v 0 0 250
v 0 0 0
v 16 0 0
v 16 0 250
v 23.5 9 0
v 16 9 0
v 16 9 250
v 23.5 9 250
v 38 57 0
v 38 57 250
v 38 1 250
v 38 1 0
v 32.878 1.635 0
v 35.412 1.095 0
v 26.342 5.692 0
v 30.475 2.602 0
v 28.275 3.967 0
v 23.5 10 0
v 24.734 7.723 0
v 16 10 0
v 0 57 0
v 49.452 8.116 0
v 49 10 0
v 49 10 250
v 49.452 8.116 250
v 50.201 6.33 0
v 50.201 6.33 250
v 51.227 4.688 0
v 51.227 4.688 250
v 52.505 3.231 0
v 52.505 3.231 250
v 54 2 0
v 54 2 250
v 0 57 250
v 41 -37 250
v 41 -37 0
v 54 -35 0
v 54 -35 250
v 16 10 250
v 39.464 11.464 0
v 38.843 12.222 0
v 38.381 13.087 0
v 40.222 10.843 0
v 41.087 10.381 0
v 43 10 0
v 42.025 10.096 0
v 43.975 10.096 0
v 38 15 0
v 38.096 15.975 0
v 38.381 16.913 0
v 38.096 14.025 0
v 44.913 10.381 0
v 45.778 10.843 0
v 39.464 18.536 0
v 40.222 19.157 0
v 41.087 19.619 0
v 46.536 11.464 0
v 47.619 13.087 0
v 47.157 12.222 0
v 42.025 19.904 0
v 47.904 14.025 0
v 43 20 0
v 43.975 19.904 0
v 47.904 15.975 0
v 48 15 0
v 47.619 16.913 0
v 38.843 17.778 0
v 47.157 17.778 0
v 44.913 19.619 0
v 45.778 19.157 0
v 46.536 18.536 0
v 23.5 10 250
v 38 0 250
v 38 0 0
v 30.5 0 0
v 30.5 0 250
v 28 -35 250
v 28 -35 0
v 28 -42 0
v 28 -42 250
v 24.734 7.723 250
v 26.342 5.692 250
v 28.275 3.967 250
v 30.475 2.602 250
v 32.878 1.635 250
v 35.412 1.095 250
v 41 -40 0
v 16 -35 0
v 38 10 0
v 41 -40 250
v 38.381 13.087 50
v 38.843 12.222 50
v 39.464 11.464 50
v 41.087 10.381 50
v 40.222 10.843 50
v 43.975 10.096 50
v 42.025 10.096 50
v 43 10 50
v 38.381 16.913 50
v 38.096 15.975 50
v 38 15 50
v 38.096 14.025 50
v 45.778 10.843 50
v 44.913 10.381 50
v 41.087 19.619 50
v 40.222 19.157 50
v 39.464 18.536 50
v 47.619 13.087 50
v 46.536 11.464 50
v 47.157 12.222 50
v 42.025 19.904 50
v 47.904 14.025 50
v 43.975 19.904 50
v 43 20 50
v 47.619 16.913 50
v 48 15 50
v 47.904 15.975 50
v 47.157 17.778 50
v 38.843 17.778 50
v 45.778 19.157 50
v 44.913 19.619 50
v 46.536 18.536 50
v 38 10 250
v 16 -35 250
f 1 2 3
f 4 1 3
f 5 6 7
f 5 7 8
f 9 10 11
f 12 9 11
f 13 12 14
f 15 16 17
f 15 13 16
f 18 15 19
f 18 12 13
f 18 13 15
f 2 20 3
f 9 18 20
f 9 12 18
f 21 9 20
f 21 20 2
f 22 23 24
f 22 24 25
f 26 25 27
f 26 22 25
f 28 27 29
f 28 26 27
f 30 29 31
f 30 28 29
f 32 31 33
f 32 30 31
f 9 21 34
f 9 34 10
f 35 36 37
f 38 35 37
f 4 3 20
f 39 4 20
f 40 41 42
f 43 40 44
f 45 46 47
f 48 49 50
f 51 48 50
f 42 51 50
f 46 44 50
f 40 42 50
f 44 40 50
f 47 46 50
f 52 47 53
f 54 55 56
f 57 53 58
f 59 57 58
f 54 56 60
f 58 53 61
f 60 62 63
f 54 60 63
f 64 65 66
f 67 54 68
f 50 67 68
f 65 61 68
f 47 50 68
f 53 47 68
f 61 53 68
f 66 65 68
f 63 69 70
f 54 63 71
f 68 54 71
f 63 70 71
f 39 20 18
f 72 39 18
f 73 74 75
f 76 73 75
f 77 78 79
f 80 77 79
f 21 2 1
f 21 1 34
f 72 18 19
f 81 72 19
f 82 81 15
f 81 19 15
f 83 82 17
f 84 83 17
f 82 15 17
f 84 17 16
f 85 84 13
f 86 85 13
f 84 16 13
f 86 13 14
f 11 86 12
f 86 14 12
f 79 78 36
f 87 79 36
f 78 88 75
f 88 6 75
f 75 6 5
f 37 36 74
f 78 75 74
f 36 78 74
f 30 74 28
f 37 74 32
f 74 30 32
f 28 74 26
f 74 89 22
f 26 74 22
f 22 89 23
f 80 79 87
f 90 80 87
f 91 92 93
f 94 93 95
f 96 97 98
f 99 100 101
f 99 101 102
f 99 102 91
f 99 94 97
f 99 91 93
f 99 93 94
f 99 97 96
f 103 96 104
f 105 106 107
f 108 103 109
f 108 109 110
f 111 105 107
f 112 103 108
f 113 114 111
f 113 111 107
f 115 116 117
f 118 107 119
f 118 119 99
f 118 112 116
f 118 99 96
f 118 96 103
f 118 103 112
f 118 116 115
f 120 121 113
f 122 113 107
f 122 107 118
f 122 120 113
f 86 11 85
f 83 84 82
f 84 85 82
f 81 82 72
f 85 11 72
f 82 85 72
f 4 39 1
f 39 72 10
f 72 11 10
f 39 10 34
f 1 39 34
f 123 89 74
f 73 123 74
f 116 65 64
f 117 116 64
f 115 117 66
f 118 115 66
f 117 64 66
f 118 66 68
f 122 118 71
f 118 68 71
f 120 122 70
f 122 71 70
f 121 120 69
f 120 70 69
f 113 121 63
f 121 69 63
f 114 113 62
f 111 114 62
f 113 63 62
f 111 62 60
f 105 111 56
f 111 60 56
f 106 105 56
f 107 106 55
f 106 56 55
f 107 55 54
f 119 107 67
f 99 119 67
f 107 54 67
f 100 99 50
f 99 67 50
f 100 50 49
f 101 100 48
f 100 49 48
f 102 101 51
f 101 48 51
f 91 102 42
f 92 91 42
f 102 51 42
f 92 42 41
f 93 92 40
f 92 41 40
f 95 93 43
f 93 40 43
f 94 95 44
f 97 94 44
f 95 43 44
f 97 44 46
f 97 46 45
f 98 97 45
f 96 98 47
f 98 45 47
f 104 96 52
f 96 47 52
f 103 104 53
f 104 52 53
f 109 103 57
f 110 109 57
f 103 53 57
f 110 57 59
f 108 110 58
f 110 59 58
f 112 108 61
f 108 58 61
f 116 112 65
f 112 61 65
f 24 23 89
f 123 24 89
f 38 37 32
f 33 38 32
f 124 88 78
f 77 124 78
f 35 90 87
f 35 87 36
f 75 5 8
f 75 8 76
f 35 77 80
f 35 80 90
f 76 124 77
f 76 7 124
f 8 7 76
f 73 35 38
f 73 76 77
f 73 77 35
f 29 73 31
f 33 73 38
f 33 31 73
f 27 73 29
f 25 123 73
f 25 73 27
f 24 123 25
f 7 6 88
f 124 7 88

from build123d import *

# Parameters (mm, degrees)
EXTRUDE_DEPTH    = 250
EXTRUDE001_DEPTH = 250
SKETCH005_R      = 5
EXTRUDE002_DEPTH = 50


with BuildPart() as extrude_body:
    # Sketch003 → Extrude (new body)
    with BuildSketch(Plane.XY):
        with BuildLine():
            Line((0, 0), (0, 57))
            Line((0, 57), (38, 57))
            Line((38, 57), (38, 1))
            ThreePointArc((23.5, 10), (29.345332, 3.236924), (38, 1))
            Line((16, 10), (23.5, 10))
            Line((16, 0), (16, 10))
            Line((0, 0), (16, 0))
        make_face()
    extrude(amount=EXTRUDE_DEPTH)


with BuildPart() as extrude001:
    # Sketch004 (on Sketch) → Extrude001 (new body)
    with BuildSketch(Plane.XY):
        with BuildLine():
            Line((16, -35), (28, -35))
            Line((28, -35), (28, -42))
            Line((28, -42), (41, -40))
            Line((41, -40), (41, -37))
            Line((41, -37), (54, -35))
            Line((54, -35), (54, 2))
            ThreePointArc((49, 10), (50.680866, 5.488041), (54, 2))
            Line((49, 10), (38, 10))
            Line((38, 10), (38, 0))
            Line((38, 0), (30.5, 0))
            Line((23.5, 9), (30.5, 0))
            Line((16, 9), (23.5, 9))
            Line((16, 9), (16, -35))
        make_face()
    extrude(amount=EXTRUDE001_DEPTH)


with BuildPart() as extrude002:
    # Sketch005 (on Sketch) → Extrude002 (new body)
    with BuildSketch(Plane.XY):
        with Locations((43, 15)):
            Circle(SKETCH005_R)
    extrude(amount=EXTRUDE002_DEPTH)


solid = Compound([extrude_body.part, extrude001.part, extrude002.part])
